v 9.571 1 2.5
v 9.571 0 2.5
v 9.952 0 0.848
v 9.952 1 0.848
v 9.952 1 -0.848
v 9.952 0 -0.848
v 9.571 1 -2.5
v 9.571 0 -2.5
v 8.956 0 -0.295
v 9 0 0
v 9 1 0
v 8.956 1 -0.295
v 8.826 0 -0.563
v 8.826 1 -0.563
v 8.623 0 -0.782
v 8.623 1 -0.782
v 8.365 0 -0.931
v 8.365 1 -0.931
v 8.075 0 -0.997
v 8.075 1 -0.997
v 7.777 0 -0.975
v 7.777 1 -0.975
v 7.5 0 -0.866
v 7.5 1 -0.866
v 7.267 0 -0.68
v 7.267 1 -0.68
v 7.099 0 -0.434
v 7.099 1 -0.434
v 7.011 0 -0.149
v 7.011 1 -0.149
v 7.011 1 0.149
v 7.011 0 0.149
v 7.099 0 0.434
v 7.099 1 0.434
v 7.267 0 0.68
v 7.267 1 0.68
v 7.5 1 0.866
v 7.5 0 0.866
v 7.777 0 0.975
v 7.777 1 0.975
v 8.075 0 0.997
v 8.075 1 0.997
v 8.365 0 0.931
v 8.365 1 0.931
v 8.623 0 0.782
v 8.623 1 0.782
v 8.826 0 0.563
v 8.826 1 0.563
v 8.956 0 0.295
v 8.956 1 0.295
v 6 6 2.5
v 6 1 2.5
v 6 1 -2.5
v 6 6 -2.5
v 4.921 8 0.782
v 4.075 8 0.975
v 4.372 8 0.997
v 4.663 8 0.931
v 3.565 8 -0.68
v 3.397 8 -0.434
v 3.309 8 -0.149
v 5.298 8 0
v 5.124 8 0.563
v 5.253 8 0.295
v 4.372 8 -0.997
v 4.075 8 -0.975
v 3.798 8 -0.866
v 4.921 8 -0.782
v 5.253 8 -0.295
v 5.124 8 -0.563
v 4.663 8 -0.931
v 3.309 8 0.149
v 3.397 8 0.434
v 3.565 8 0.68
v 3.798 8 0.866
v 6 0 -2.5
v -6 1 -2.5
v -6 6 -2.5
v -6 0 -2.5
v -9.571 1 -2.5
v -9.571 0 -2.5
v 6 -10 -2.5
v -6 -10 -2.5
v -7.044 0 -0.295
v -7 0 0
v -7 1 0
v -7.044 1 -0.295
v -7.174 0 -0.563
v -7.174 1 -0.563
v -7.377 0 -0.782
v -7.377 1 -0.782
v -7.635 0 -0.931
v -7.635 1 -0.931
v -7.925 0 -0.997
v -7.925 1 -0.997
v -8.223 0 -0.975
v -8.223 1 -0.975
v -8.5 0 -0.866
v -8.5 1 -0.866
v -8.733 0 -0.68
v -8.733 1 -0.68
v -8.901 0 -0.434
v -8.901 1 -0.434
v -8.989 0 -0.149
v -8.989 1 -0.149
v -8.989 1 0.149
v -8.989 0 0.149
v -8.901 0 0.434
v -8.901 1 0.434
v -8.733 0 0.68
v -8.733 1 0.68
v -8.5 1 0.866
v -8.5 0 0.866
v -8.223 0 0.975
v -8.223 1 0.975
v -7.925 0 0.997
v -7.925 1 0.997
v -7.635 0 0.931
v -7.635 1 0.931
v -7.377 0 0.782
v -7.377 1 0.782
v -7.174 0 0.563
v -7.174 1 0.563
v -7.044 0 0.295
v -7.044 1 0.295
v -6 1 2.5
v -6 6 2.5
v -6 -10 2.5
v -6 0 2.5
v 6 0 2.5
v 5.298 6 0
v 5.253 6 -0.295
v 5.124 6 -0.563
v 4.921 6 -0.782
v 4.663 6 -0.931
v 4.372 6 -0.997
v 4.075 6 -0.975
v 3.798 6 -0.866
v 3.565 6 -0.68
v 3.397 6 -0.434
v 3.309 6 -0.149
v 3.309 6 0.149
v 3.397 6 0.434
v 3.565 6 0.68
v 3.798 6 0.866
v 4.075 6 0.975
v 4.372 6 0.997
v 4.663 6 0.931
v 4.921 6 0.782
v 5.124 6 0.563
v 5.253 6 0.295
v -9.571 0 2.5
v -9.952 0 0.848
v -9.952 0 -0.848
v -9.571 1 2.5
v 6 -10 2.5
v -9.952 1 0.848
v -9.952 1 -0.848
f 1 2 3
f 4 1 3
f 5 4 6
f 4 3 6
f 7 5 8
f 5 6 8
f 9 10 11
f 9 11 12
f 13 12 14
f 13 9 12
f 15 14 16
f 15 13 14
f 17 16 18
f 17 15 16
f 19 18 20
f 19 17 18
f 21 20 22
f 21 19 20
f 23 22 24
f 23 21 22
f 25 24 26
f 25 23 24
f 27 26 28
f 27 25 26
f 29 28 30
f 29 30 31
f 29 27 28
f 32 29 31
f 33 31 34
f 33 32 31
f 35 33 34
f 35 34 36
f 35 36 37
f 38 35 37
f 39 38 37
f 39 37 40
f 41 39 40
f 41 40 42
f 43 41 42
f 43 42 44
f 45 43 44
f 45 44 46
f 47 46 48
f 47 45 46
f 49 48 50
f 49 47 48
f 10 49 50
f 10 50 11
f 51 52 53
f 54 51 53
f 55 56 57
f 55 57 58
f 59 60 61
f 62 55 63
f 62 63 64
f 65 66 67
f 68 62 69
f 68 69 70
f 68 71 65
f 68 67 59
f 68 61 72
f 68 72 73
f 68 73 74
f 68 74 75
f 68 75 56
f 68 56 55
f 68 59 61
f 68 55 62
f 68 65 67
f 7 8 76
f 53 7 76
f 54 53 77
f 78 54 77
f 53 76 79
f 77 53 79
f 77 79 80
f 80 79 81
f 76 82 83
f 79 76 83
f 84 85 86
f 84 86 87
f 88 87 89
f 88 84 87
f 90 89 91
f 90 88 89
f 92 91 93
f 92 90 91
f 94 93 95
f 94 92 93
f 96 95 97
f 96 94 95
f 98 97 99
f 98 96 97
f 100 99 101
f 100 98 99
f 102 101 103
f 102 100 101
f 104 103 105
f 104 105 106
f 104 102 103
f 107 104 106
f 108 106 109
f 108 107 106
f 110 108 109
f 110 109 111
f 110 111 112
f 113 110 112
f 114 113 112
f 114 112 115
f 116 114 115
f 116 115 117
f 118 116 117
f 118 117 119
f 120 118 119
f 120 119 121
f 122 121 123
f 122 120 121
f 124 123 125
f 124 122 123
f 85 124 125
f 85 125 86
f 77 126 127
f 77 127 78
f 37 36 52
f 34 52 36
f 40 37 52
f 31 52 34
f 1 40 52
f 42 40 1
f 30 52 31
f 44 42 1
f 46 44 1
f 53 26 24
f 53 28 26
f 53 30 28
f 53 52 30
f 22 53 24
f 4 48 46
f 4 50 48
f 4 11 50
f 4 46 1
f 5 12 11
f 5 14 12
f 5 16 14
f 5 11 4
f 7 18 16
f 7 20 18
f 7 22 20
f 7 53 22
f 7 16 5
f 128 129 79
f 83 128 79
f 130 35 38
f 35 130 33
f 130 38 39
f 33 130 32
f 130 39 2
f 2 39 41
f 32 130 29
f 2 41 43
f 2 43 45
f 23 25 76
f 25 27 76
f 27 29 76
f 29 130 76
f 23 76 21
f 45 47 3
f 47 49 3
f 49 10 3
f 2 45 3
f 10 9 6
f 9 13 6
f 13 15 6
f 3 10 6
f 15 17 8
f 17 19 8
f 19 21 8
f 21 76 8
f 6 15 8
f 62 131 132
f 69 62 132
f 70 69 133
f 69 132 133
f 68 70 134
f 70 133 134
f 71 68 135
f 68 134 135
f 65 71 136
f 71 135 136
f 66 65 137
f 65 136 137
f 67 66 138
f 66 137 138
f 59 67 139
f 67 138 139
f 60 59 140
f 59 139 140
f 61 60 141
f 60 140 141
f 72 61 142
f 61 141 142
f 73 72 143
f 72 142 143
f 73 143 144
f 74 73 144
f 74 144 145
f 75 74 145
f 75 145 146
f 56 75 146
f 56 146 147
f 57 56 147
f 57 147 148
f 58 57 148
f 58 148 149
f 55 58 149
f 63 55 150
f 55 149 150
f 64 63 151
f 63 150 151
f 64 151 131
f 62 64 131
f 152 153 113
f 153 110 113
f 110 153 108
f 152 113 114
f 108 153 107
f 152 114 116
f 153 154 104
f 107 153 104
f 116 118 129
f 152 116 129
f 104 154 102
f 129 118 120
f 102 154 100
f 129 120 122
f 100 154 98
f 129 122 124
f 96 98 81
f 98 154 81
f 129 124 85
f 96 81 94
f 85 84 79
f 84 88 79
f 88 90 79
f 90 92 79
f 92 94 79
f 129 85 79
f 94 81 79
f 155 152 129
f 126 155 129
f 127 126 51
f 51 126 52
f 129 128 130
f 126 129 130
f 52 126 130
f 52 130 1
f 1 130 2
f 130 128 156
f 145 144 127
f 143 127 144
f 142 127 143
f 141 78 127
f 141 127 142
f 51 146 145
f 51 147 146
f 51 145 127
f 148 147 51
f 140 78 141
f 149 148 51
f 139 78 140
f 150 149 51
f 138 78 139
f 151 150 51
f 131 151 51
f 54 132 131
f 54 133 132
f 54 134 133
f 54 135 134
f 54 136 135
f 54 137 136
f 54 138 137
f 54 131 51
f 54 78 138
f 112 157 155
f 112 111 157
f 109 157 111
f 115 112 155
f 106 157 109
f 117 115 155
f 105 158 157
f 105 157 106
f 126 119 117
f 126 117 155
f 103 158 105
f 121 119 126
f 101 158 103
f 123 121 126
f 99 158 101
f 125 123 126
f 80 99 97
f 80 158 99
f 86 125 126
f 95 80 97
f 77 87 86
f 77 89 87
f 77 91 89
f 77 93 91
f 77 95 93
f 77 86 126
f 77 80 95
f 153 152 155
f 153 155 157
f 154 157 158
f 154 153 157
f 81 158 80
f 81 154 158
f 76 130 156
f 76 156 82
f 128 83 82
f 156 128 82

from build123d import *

# Parameters (mm, degrees)
SKETCH1_W           = 12
SKETCH1_H           = 5
BOSS_EXTRUDE1_DEPTH = 10
SKETCH2_R           = 1
SKETCH2_W           = 12
SKETCH2_H           = 5
BOSS_EXTRUDE2_DEPTH = 1
SKETCH3_W           = 12
SKETCH3_H           = 5
BOSS_EXTRUDE3_DEPTH = 5
SKETCH4_R           = 1
BOSS_EXTRUDE4_DEPTH = 2


with BuildPart() as part:
    # Sketch1 → Boss-Extrude1 (new body)
    with BuildSketch(Plane(origin=(0, 0, 0), x_dir=(1, 0, 0), z_dir=(0, 1, 0))):
        Rectangle(SKETCH1_W, SKETCH1_H)
    extrude(amount=-BOSS_EXTRUDE1_DEPTH)

    # Sketch2 → Boss-Extrude2 (add)
    with BuildSketch(Plane(origin=(0, 0, 0), x_dir=(1, 0, 0), z_dir=(0, 1, 0))):
        with BuildLine():
            Line((6, -2.5), (9.571067871, -2.5))
            ThreePointArc((9.571067871, -2.5), (10, 1e-08), (9.571067753, 2.5))
            Line((9.571067753, 2.5), (6, 2.5))
            Line((6, 2.5), (6, -2.5))
        make_face()
        with Locations((8, -5.35e-07)):
            Circle(SKETCH2_R, mode=Mode.SUBTRACT)
        Rectangle(SKETCH2_W, SKETCH2_H)
        with BuildLine():
            ThreePointArc((-9.571067871, -2.5), (-10, 1e-08), (-9.571067753, 2.5))
            Line((-9.571067753, 2.5), (-6, 2.5))
            Line((-6, 2.5), (-6, -2.5))
            Line((-6, -2.5), (-9.571067871, -2.5))
        make_face()
        with Locations((-8, -5.35e-07)):
            Circle(SKETCH2_R, mode=Mode.SUBTRACT)
    extrude(amount=BOSS_EXTRUDE2_DEPTH)

    # Sketch3 → Boss-Extrude3 (add)
    with BuildSketch(Plane(origin=(0, 1, 0), x_dir=(1, 0, 0), z_dir=(0, 1, 0))):
        Rectangle(SKETCH3_W, SKETCH3_H)
    extrude(amount=BOSS_EXTRUDE3_DEPTH)

    # Sketch4 → Boss-Extrude4 (add)
    with BuildSketch(Plane(origin=(0, 6, 0), x_dir=(1, 0, 0), z_dir=(0, 1, 0))):
        with Locations((4.297757617, 0)):
            Circle(SKETCH4_R)
    extrude(amount=BOSS_EXTRUDE4_DEPTH)


solid = part.part
